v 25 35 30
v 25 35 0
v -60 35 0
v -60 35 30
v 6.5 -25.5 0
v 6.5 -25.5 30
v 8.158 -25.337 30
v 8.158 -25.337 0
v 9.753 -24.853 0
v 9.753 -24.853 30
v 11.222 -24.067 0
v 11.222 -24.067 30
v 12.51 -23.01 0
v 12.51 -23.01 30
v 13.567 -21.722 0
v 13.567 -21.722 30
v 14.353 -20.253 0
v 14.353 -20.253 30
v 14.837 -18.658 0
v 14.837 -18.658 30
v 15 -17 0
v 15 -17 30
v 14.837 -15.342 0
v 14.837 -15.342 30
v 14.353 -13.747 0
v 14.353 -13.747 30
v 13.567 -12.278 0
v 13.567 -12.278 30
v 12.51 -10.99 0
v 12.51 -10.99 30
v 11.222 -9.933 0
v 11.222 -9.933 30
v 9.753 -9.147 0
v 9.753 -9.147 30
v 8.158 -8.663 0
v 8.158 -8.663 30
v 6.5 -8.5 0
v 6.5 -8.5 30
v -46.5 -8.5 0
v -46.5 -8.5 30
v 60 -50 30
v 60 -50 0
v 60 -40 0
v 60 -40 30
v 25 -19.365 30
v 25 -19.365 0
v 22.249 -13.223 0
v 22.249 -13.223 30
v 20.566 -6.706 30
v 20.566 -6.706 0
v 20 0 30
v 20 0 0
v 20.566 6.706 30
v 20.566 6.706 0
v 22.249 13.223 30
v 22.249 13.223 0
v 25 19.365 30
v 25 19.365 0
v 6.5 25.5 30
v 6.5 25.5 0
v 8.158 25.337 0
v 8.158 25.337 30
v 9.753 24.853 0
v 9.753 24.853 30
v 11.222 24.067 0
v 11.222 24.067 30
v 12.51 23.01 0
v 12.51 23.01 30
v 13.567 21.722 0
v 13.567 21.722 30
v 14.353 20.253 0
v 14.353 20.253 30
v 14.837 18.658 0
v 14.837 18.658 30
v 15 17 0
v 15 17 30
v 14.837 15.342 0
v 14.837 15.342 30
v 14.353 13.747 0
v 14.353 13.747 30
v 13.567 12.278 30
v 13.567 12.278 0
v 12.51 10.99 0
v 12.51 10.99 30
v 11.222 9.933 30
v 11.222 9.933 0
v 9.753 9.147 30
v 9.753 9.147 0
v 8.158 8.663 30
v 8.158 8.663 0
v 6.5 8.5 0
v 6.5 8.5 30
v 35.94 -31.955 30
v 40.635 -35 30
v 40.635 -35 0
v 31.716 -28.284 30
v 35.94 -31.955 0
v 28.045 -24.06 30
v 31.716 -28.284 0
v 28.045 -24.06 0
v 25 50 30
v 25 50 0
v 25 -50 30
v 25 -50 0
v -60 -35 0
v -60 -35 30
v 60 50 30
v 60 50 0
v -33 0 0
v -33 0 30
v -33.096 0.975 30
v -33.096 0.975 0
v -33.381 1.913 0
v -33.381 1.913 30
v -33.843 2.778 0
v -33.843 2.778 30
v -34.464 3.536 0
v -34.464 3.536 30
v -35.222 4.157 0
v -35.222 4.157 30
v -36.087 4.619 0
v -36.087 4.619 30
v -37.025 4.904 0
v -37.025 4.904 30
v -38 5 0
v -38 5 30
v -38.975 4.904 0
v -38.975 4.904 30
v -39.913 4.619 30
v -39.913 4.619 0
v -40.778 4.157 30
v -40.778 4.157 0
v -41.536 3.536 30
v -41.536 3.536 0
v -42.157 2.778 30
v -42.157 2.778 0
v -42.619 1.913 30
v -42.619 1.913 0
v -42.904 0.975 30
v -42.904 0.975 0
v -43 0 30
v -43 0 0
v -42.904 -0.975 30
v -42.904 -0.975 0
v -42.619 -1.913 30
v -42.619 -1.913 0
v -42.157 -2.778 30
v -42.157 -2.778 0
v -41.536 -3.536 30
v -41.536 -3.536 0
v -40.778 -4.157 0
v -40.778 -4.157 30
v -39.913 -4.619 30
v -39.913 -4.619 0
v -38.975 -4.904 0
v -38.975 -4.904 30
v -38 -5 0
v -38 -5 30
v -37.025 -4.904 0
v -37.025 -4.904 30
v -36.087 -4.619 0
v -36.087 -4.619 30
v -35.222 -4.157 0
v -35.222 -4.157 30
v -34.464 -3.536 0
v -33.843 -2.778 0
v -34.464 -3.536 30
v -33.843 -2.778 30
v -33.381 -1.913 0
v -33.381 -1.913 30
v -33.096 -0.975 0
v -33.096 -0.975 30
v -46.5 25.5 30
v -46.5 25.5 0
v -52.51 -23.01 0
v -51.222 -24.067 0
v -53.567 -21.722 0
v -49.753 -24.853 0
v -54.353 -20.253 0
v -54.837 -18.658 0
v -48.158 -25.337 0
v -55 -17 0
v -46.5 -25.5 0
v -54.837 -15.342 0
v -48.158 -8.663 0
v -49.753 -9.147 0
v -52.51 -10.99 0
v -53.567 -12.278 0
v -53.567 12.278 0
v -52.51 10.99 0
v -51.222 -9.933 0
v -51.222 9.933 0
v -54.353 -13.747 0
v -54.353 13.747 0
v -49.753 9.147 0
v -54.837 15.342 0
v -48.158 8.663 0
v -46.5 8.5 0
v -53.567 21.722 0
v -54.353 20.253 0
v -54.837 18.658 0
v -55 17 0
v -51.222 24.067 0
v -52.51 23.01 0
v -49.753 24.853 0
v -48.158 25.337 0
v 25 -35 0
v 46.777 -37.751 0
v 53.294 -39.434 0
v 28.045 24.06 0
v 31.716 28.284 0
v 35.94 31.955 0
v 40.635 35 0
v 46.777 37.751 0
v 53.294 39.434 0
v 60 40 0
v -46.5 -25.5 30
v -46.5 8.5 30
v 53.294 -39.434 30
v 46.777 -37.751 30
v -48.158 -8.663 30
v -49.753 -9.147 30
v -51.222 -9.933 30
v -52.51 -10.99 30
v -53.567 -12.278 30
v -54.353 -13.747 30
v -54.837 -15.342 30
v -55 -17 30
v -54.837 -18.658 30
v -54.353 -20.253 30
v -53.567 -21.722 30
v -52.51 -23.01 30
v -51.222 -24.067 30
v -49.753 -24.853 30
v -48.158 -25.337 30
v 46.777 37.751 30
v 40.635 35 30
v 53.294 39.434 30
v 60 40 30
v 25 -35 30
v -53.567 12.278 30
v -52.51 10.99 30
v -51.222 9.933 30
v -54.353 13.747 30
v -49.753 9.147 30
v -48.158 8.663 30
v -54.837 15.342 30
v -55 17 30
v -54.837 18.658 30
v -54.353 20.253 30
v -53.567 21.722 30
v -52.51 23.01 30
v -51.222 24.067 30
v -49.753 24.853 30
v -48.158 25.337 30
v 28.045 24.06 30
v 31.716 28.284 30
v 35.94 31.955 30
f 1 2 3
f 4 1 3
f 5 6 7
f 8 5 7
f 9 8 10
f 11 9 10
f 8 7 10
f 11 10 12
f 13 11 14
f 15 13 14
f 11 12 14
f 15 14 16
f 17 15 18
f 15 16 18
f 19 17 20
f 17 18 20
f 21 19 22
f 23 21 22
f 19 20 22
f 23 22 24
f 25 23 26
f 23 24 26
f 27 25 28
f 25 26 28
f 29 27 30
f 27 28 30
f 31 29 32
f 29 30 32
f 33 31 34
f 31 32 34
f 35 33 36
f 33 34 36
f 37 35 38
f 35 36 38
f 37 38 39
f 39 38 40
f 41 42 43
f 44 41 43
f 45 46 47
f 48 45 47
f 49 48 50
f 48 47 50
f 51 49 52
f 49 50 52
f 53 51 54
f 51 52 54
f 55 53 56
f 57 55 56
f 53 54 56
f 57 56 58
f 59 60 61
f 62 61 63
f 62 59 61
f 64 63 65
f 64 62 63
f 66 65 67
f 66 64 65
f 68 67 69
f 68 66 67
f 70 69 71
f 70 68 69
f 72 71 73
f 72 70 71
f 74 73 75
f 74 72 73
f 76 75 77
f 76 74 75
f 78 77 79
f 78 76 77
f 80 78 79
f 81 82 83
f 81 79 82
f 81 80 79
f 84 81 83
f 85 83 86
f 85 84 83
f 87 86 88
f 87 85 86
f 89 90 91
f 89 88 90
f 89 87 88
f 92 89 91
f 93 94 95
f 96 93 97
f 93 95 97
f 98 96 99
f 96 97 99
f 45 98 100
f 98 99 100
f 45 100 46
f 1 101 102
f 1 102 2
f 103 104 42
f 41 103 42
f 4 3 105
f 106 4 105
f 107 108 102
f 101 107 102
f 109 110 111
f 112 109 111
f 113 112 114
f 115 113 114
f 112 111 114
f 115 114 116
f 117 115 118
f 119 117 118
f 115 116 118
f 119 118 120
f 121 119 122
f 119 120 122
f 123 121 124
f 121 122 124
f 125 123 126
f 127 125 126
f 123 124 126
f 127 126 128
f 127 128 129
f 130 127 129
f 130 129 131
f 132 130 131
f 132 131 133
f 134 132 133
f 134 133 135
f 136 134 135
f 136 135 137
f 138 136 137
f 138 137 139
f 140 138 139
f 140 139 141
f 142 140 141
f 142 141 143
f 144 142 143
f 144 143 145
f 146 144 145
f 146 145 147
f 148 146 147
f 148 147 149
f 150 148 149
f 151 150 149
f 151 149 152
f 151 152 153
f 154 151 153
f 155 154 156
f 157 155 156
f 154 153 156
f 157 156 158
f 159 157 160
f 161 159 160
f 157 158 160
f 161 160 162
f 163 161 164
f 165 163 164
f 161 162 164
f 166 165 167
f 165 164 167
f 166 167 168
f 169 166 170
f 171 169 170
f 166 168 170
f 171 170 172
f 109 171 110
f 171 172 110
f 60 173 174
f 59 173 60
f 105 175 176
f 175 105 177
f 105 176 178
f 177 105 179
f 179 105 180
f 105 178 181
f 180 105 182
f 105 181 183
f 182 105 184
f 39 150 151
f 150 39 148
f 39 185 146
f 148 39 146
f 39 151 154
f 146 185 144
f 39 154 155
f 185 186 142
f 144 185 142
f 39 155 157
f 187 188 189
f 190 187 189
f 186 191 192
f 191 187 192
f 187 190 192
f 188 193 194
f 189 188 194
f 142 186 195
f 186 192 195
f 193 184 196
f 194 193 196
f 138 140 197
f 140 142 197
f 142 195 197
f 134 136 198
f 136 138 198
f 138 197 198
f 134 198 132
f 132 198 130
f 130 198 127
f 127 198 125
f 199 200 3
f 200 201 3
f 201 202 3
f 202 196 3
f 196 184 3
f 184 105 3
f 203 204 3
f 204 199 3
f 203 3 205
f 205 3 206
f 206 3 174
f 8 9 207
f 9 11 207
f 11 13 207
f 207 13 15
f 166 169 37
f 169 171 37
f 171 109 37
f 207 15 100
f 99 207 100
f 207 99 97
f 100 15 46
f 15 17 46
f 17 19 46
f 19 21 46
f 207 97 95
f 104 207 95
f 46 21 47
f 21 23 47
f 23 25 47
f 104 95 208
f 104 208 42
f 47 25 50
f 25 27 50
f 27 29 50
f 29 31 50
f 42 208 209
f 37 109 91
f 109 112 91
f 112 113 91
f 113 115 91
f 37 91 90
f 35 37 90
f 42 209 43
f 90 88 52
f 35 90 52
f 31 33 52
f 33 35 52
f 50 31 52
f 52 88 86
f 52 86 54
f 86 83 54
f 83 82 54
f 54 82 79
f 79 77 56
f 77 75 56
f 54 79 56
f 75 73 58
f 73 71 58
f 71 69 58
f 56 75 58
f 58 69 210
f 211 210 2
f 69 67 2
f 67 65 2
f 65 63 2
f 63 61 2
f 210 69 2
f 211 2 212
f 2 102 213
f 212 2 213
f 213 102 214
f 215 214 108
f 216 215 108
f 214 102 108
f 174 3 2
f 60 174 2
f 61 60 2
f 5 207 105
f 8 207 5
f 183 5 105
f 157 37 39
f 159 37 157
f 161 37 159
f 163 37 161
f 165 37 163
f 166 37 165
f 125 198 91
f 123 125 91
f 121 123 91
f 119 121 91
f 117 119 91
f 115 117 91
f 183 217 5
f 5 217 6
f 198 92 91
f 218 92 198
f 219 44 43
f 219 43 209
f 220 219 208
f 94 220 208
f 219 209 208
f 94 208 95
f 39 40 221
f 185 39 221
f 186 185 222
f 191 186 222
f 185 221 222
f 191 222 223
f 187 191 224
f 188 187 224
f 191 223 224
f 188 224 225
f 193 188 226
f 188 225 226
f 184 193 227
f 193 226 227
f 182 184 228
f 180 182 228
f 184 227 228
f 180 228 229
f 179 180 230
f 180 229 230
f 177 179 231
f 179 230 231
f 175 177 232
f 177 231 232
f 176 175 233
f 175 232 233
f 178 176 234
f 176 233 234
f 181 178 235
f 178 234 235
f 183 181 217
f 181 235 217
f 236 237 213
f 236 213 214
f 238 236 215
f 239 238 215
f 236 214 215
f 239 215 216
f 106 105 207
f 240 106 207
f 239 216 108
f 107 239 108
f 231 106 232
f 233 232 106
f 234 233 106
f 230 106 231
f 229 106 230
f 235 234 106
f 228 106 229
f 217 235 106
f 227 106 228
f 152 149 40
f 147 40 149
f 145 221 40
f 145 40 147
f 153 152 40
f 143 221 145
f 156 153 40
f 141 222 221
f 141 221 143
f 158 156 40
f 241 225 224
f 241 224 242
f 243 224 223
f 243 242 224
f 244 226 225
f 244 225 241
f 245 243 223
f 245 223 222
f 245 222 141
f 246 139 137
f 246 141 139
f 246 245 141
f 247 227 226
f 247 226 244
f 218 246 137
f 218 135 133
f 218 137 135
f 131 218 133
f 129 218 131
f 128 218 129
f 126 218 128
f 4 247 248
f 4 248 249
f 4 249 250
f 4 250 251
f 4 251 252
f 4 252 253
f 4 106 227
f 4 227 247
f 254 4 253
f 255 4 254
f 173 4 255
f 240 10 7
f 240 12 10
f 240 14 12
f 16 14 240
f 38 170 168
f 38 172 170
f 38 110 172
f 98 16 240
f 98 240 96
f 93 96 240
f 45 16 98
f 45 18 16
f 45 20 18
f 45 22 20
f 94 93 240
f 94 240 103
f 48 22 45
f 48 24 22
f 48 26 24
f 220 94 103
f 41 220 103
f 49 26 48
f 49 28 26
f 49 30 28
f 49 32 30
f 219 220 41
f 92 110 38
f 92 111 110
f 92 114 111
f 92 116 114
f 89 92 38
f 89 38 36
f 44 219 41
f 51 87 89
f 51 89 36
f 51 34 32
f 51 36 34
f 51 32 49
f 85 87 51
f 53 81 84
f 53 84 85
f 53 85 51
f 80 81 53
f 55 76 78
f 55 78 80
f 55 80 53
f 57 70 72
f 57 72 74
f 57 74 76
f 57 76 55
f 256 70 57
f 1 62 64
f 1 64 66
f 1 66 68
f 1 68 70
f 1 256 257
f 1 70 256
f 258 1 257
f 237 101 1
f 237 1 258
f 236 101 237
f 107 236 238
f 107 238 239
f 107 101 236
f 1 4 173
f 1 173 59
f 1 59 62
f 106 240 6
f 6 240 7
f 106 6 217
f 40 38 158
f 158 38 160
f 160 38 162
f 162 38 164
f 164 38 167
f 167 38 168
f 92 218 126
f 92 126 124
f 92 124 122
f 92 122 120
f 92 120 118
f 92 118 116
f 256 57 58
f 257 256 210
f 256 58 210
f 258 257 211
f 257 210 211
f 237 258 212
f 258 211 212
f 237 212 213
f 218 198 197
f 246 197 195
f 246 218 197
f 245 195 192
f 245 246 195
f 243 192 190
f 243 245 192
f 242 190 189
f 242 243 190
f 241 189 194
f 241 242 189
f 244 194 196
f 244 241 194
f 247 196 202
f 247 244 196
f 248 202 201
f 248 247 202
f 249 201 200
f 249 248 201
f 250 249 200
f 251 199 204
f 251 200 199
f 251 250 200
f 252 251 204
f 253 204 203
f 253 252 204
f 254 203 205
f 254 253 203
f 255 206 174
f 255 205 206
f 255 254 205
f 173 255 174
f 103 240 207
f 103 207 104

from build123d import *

# Parameters (mm, degrees)
EXTRUDE_1_DEPTH     = 30
CUT_EXTRUDE_1_DEPTH = 84.666002653
SKETCH_4_R          = 5
CUT_EXTRUDE_2_DEPTH = 84.666002653


with BuildPart() as part:
    # Эскиз1 → Бобышка-Вытянуть1 (new body)
    with BuildSketch(Plane.XY):
        with BuildLine():
            Line((60, -50), (60, -40))
            ThreePointArc((60, -40), (50, -38.729833462), (40.635083269, -35))
            Line((40.635083269, -35), (25, -35))
            Line((25, -35), (25, -50))
            Line((25, -50), (60, -50))
        make_face()
        with BuildLine():
            Line((25, -35), (40.635083269, -35))
            ThreePointArc((40.635083269, -35), (31.715728753, -28.284271247), (25, -19.364916731))
            Line((25, -19.364916731), (25, -35))
        make_face()
        with BuildLine():
            Line((25, 19.364916731), (25, 35))
            Line((25, 35), (-60, 35))
            Line((-60, 35), (-60, -35))
            Line((-60, -35), (25, -35))
            Line((25, -35), (25, -19.364916731))
            ThreePointArc((25, -19.364916731), (20, 0), (25, 19.364916731))
        make_face()
        with BuildLine():
            ThreePointArc((25, 19.364916731), (31.715728753, 28.284271247), (40.635083269, 35))
            Line((40.635083269, 35), (25, 35))
            Line((25, 35), (25, 19.364916731))
        make_face()
        with BuildLine():
            ThreePointArc((40.635083269, 35), (50, 38.729833462), (60, 40))
            Line((60, 40), (60, 50))
            Line((60, 50), (25, 50))
            Line((25, 50), (25, 35))
            Line((25, 35), (40.635083269, 35))
        make_face()
    extrude(amount=EXTRUDE_1_DEPTH)

    # Эскиз3 → Вырез-Вытянуть1 (cut, through all)
    with BuildSketch(Plane.XY.offset(30)):
        with BuildLine():
            Line((-46.5, 25.5), (6.5, 25.5))
            ThreePointArc((6.5, 25.5), (15, 17), (6.5, 8.5))
            Line((6.5, 8.5), (-46.5, 8.5))
            ThreePointArc((-46.5, 8.5), (-55, 17), (-46.5, 25.5))
        make_face()
        with BuildLine():
            Line((-46.5, -25.5), (6.5, -25.5))
            ThreePointArc((6.5, -25.5), (15, -17), (6.5, -8.5))
            Line((6.5, -8.5), (-46.5, -8.5))
            ThreePointArc((-46.5, -8.5), (-55, -17), (-46.5, -25.5))
        make_face()
    extrude(amount=-CUT_EXTRUDE_1_DEPTH, mode=Mode.SUBTRACT)

    # Эскиз4 → Вырез-Вытянуть2 (cut, through all)
    with BuildSketch(Plane.XY.offset(30)):
        with Locations((-38, 0)):
            Circle(SKETCH_4_R)
    extrude(amount=-CUT_EXTRUDE_2_DEPTH, mode=Mode.SUBTRACT)


solid = part.part
